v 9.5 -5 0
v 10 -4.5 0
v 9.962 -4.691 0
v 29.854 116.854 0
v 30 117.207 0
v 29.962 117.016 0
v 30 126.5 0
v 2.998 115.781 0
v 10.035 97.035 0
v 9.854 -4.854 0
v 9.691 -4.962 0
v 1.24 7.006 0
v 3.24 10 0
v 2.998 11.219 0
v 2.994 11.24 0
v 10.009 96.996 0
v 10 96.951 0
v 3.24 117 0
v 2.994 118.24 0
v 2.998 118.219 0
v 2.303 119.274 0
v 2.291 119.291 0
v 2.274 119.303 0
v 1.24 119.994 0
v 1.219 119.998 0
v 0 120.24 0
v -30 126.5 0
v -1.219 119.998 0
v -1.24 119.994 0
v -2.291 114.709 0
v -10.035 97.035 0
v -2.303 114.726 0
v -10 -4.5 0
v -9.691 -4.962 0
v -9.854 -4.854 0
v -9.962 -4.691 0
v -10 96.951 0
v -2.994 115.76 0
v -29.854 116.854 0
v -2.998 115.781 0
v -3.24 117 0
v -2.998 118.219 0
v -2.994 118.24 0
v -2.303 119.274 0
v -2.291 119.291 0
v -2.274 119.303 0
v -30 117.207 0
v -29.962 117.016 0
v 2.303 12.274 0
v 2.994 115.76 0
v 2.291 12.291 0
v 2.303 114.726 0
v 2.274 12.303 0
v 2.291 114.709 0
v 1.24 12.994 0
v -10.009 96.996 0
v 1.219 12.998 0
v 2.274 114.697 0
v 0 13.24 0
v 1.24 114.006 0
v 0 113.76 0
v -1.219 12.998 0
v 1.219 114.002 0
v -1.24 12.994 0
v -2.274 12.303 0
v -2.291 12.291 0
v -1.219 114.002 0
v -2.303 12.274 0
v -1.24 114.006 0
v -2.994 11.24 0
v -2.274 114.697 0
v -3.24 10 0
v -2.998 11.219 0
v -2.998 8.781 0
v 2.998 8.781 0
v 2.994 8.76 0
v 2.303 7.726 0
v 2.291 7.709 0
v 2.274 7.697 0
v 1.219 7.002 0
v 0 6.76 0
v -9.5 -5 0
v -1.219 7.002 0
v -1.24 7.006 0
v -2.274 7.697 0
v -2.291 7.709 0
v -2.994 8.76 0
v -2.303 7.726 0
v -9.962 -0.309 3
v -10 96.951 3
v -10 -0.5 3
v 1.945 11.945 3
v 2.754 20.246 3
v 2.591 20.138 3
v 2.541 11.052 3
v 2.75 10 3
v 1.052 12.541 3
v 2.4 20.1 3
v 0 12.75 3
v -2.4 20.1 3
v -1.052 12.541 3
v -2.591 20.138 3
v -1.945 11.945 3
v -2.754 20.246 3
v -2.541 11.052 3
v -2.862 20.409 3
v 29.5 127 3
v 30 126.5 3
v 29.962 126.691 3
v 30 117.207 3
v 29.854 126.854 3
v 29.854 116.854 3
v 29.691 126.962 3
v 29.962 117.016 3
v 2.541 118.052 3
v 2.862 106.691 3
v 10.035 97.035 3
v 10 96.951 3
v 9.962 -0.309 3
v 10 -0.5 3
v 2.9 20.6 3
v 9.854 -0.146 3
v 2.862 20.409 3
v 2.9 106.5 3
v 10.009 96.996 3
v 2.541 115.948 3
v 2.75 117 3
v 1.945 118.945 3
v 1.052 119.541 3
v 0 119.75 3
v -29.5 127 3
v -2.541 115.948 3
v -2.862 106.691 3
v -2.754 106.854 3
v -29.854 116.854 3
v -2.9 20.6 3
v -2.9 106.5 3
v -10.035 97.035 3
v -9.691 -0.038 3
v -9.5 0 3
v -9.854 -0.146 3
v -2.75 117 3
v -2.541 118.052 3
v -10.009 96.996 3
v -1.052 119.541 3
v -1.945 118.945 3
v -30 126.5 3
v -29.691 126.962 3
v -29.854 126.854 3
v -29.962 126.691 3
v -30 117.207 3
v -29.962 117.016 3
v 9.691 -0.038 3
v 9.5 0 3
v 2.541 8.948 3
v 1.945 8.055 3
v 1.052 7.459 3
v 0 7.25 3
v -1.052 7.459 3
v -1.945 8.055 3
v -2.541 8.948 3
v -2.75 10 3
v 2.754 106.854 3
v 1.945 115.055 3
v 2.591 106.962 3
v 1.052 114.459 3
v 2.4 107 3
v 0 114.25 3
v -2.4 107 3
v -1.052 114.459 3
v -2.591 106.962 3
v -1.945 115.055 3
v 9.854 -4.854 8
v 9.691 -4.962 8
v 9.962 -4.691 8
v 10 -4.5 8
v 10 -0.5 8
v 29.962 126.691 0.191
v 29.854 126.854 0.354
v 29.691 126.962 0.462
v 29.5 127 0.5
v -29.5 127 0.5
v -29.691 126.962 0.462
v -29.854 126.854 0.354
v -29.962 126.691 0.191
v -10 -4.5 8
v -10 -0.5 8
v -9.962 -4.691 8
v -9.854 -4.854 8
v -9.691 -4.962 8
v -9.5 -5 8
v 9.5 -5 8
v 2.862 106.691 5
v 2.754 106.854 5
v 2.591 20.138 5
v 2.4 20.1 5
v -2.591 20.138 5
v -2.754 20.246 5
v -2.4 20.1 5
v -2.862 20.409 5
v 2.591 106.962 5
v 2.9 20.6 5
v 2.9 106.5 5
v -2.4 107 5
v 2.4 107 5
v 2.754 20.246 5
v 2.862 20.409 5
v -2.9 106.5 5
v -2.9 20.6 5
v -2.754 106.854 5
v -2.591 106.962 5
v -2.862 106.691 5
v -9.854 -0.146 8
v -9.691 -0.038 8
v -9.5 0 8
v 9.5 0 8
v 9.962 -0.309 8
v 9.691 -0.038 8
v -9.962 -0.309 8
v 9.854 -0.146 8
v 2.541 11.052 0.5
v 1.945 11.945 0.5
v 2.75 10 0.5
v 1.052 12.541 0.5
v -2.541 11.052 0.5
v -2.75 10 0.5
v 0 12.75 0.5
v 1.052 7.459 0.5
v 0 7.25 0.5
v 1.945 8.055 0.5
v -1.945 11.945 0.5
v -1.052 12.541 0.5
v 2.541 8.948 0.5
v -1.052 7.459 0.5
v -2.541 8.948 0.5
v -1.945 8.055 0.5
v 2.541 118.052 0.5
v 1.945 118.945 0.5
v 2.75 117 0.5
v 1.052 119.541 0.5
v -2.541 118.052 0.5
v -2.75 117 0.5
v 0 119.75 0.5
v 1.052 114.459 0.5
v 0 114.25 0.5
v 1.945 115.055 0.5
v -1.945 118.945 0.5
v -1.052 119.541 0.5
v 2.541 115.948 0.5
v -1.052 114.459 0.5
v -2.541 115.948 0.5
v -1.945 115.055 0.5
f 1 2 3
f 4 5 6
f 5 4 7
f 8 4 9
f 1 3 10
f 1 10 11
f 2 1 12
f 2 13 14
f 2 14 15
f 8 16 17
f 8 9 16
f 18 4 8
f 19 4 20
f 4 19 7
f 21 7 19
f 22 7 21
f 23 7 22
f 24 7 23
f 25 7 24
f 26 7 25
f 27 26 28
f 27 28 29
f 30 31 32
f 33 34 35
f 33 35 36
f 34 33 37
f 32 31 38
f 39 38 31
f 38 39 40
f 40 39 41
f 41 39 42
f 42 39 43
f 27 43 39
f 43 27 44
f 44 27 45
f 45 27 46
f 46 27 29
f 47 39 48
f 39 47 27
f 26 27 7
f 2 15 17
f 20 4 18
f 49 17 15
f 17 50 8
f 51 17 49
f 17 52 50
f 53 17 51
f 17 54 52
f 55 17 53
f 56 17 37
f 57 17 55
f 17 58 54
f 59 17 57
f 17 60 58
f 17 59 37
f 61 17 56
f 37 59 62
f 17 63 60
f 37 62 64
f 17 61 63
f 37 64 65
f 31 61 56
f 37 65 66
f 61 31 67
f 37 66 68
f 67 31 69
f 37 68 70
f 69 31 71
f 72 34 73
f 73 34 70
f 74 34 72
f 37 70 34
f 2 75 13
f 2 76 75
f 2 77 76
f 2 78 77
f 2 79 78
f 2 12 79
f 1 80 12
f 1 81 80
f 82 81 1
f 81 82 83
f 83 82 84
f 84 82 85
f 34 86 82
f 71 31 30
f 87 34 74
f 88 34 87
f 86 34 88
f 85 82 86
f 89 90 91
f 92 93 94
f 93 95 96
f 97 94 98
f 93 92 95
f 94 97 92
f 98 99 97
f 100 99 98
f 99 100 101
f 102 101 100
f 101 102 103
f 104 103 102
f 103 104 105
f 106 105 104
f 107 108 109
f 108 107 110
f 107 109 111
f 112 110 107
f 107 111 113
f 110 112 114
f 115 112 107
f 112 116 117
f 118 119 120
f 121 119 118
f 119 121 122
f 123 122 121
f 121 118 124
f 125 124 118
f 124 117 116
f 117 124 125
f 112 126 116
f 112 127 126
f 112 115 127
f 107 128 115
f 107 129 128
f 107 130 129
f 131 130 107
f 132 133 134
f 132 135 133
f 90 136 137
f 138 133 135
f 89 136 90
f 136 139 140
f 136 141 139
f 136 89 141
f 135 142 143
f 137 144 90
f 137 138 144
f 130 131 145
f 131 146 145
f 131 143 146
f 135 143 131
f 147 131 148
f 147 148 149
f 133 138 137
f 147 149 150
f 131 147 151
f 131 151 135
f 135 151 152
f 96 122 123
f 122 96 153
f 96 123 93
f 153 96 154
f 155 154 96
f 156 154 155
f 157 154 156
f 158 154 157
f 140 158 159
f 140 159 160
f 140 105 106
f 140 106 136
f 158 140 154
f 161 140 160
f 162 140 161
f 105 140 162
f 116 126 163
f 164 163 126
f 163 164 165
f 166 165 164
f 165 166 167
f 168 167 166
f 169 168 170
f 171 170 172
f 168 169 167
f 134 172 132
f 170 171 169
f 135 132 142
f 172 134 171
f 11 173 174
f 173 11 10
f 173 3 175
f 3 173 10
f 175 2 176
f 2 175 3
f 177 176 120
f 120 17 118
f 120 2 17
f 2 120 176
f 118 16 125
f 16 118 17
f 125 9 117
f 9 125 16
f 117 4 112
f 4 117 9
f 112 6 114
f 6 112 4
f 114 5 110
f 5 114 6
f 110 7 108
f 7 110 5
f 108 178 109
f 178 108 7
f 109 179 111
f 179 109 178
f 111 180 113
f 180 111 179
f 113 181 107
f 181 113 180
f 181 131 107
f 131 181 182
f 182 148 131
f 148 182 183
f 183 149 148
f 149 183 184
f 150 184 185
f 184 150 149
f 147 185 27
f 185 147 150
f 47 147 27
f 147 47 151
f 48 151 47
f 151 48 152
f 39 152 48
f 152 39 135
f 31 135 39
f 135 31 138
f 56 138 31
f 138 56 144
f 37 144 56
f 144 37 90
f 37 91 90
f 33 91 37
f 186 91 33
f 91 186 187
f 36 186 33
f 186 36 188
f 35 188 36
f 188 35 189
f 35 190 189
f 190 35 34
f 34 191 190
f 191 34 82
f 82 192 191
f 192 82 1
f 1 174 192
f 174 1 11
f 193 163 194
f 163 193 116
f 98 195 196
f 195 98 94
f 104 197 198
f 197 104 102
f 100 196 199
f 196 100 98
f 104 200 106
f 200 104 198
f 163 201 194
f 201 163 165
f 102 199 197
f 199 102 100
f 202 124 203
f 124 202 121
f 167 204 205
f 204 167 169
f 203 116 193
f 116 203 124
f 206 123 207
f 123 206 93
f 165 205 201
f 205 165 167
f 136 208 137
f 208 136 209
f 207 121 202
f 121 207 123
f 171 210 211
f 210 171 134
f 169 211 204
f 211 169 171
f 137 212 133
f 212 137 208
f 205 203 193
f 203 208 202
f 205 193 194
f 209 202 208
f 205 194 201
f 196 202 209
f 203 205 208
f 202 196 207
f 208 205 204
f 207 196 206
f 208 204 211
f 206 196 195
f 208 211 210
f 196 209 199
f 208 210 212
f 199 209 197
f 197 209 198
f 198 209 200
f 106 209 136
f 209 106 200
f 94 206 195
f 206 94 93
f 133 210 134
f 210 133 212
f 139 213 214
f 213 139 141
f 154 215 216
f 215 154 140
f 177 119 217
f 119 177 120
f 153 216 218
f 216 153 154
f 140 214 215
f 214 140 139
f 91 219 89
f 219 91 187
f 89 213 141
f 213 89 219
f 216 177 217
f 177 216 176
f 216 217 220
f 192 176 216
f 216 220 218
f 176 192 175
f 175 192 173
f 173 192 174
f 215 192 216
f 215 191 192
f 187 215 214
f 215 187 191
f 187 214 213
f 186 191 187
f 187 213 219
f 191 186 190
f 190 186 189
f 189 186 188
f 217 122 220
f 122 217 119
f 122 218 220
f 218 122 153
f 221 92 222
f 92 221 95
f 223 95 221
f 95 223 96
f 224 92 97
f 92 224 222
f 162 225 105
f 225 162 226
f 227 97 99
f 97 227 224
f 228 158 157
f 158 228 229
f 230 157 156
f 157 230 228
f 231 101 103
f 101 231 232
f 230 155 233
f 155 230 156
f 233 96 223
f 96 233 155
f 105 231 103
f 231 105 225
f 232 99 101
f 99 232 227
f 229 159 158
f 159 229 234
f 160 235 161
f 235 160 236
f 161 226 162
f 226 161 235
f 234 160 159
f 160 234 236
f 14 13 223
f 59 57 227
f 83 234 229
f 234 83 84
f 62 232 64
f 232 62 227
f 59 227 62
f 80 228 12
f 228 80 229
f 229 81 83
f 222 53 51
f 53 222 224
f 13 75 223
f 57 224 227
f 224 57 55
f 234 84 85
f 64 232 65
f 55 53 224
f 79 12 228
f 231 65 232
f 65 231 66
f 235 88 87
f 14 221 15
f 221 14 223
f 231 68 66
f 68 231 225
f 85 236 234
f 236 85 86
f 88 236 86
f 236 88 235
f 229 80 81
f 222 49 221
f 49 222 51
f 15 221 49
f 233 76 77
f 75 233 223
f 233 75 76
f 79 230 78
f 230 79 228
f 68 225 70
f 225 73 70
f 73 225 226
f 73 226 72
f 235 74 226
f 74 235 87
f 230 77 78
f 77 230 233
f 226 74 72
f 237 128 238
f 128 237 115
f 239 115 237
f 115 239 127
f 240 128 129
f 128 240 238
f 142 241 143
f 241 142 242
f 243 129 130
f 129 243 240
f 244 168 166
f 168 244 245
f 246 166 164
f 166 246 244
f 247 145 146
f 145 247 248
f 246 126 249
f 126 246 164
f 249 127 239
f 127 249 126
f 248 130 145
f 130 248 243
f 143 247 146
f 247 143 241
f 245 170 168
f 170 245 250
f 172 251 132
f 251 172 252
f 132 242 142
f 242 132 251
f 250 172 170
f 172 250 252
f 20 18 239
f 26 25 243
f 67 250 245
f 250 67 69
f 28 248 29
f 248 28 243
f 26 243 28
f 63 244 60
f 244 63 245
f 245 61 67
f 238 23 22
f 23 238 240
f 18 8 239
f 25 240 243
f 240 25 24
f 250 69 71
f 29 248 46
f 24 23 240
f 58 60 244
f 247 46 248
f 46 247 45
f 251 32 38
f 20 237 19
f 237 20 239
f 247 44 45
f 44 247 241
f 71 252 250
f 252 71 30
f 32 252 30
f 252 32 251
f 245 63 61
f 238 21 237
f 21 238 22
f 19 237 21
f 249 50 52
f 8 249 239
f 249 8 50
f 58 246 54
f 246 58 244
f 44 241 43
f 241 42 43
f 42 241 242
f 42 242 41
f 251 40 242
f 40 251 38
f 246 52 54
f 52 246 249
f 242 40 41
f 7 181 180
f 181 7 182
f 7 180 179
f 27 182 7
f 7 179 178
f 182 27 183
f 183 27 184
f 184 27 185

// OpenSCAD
// AM8 Z frame alignment jig
// gmarsh23@thingiverse
// V1.1, apr.27/2018

// distance from rear of printer to rear of Z frame
// 127mm for standard AM8 design
magic_distance = 127;

// main bracket thickness
thickness = 3;
// height of 'ridge' in center of bracket
ridge_height = 2;
// height and width of "hook" on end of bracket
hook_height = 5;
hook_width = 5;

// shrinks center ridge slightly so it fits better in slot without getting stuck
ridge_shrink = 0.2;
// reduces effect of "corner bulge" in corners
corner_radius = 0.5;

// chamfer on end of base that butts against Z frame
// prevents first layer overextrusion from making bracket inconsistently longer
end_chamfer = 0.5;

// hole diameter and chamfer
hole_dia = 5.5;
hole_chamfer = 0.5;

// number of segments in holes/corners/etc
$fn=16;

// nudge (makes previews look nice, doesn't affect geometry)
nudge = 0.01;


difference() {
    union() {
        
        // base
        linear_extrude(height=thickness) offset(r=corner_radius) offset(r=-corner_radius)
            polygon([
                [-10,-hook_width],
                [-10,(magic_distance-30)],
                [-30,(magic_distance-10)],
                [-30,magic_distance],
                [30,magic_distance],
                [30,(magic_distance-10)],
                [10,(magic_distance-30)],
                [10,-hook_width]
            ]);
        
        // ridge
        ridge_width = 6-ridge_shrink;
        linear_extrude(height=ridge_height+thickness) offset(r=corner_radius) offset(r=-corner_radius)
            polygon([
                [-ridge_width/2,20+ridge_shrink/2],
                [-ridge_width/2,magic_distance-20],
                [ridge_width/2,magic_distance-20],
                [ridge_width/2,20+ridge_shrink/2]
            ]);
        
        // end hook
        linear_extrude(height=thickness+hook_height) offset(r=corner_radius) offset(r=-corner_radius)
            polygon([[-10,0],[-10,-hook_width],[10,-hook_width],[10,0]]);
    }
    
    // holes
    translate([0,10,-nudge]) {
        cylinder(d=hole_dia,h=thickness+2*nudge);
        cylinder(d1=hole_dia+2*hole_chamfer,d2=hole_dia,h=hole_chamfer+nudge);
    }
    translate([0,magic_distance-10,-nudge]) {
        cylinder(d=hole_dia,h=thickness+2*nudge);
        cylinder(d1=hole_dia+2*hole_chamfer,d2=hole_dia,h=hole_chamfer+nudge);
    }
    
    // end chamfer
    chamfer_yz = end_chamfer * (2*sin(45));
    translate([0,magic_distance,0])
        rotate([45,0,0])
            cube([61,chamfer_yz,chamfer_yz],center=true);
    
}
